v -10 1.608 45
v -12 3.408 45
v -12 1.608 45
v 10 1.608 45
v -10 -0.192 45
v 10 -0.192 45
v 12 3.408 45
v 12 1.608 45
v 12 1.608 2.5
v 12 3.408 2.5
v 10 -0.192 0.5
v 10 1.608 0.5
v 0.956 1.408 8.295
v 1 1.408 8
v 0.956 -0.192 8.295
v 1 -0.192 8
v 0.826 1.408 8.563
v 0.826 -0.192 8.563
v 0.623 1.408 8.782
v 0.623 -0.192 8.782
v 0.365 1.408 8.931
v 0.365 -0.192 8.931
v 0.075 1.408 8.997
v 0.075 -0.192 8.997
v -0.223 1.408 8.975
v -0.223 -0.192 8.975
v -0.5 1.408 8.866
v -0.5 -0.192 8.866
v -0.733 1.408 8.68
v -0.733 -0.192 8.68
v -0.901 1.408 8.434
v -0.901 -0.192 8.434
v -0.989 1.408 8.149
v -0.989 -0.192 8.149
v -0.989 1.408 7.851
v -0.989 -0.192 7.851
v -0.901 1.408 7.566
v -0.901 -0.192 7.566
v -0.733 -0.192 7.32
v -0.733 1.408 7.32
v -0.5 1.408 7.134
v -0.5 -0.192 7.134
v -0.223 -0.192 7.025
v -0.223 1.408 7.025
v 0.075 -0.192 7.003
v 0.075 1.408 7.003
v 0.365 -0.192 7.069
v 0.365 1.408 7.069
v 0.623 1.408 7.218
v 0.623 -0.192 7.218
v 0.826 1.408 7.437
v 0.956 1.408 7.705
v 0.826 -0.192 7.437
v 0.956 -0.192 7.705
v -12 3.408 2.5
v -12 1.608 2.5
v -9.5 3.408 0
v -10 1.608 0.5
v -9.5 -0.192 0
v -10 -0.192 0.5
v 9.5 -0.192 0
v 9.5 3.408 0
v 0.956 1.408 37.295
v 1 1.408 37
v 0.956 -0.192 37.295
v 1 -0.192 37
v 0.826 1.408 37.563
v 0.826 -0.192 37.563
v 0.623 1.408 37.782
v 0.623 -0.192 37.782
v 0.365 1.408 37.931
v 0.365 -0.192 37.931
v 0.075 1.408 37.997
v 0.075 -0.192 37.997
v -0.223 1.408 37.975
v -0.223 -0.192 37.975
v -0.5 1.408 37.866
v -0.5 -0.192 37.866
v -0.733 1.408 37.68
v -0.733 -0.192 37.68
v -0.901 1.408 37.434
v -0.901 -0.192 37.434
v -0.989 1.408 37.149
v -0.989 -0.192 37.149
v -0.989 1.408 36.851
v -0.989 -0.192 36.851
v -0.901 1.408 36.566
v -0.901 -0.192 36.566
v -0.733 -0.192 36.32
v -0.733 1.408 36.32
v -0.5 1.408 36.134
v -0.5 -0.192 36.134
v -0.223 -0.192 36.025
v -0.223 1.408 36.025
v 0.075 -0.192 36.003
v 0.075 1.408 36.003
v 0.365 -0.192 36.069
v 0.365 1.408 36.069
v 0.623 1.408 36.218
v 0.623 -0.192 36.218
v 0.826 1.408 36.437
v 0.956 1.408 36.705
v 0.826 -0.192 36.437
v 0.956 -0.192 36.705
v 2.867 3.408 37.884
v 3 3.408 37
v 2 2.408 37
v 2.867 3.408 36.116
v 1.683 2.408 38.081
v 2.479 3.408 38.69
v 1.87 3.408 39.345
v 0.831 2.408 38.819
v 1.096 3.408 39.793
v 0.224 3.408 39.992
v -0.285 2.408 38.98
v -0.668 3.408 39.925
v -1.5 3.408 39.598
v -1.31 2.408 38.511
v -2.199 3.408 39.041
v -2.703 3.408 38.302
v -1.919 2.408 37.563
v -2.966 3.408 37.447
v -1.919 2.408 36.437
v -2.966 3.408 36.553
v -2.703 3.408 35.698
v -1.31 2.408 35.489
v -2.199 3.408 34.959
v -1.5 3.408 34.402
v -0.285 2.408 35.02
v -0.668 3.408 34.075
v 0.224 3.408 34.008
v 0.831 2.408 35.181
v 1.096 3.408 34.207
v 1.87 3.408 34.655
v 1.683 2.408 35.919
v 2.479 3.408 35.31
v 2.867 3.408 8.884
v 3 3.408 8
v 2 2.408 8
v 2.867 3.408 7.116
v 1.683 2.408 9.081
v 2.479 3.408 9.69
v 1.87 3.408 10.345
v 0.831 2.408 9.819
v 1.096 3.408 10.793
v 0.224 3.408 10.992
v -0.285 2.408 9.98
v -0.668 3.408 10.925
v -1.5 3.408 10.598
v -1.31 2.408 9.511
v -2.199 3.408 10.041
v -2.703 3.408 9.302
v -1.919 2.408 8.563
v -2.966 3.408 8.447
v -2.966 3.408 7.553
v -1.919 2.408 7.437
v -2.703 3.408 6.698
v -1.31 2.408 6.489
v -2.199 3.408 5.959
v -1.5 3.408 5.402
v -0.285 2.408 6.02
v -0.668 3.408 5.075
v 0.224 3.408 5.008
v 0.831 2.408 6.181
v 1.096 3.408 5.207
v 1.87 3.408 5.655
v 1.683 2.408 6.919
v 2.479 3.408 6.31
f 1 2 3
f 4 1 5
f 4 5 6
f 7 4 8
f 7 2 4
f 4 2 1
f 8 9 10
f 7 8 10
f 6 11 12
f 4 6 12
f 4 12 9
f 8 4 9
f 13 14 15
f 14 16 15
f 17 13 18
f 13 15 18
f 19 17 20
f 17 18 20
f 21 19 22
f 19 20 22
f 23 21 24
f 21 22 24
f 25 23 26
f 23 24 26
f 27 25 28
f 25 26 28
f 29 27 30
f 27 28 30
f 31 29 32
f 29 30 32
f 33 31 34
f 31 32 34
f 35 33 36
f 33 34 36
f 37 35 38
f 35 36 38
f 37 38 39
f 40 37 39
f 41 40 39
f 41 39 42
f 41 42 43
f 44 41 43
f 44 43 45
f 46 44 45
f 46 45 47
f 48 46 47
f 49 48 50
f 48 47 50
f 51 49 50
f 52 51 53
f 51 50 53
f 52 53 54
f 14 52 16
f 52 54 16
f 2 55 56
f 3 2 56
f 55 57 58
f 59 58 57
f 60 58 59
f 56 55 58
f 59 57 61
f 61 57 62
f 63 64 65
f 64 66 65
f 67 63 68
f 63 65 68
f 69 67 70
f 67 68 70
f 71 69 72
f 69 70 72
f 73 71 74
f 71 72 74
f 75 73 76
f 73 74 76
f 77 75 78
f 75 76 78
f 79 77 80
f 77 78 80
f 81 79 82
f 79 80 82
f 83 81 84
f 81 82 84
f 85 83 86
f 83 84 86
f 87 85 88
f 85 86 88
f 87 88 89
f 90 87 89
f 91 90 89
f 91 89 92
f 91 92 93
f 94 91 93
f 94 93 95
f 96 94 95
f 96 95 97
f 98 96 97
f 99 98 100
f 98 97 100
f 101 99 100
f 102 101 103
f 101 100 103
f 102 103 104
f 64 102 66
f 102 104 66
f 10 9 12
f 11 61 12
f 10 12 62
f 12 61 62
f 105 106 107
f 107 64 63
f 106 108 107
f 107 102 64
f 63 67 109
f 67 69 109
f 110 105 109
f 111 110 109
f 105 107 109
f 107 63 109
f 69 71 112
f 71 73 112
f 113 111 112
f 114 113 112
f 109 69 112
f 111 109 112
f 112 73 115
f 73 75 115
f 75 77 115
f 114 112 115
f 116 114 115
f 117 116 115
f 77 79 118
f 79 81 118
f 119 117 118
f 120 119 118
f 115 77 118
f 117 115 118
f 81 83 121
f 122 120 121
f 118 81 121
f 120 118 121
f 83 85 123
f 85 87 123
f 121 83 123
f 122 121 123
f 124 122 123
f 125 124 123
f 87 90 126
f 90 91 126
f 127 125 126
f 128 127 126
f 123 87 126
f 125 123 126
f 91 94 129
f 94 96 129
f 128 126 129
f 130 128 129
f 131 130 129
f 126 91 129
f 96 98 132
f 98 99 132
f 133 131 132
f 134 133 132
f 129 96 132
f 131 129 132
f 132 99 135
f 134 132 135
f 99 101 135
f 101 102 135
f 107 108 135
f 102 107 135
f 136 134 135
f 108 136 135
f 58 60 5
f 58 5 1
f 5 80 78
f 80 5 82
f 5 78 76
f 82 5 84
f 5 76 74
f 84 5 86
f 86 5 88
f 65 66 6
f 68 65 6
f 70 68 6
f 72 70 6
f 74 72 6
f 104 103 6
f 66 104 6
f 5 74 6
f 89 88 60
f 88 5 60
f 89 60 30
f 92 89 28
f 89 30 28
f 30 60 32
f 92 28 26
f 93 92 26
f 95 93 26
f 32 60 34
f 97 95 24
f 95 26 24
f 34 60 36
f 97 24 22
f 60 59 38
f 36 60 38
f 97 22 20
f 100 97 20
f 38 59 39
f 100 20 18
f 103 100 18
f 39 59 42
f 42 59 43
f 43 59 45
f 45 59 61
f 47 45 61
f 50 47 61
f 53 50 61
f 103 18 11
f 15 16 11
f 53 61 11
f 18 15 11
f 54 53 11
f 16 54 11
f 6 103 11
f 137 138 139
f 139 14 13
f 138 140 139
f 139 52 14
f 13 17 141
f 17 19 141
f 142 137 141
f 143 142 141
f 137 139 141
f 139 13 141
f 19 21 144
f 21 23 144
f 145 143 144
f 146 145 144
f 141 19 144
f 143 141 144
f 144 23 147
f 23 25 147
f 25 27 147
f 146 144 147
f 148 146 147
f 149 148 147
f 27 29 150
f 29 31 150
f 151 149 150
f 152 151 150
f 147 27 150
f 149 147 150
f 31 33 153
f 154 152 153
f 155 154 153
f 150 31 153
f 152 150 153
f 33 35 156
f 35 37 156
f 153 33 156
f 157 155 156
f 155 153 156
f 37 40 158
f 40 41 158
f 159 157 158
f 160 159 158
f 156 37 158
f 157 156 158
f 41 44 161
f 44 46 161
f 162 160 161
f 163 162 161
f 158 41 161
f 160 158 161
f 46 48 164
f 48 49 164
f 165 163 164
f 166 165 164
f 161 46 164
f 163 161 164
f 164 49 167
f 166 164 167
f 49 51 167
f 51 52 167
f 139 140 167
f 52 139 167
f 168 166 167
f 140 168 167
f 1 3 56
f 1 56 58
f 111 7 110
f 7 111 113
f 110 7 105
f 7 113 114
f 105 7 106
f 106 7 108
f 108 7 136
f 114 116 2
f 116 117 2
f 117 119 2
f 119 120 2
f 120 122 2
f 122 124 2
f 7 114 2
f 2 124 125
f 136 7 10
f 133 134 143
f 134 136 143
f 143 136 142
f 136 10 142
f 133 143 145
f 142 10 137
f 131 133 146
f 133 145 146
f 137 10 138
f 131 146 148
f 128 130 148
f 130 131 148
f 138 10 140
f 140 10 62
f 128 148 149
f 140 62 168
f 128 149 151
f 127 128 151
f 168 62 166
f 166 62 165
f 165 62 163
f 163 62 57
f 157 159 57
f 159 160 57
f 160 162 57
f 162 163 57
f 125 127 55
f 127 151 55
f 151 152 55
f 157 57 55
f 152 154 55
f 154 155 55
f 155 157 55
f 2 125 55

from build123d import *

# Parameters (mm, degrees)
F0_W           = 20
F0_H           = 1.8
F1_DEPTH       = 45
F2_SIZE        = 2.5
F3_SIZE        = 2.5
F5_D           = 2
F5_DEPTH       = 15
F5_CSINK_D     = 6
F5_CSINK_ANGLE = 90


with BuildPart() as f1:
    # F0 (on Top) → F1 (new body)
    with BuildSketch(Plane.XY):
        Polygon((12, 3.40756), (-12, 3.40756), (-12, 1.60756), (-10, 1.60756), (10, 1.60756), (12, 1.60756), align=None)
        with Locations((0, 0.70756)):
            Rectangle(F0_W, F0_H)
    extrude(amount=F1_DEPTH)

    # F2
    f2_edges = [f1.edges().sort_by_distance(p)[0] for p in [
        (12, 2.50756, 0),
    ]]
    chamfer(f2_edges, length=F2_SIZE)

    # F3
    f3_edges = [f1.edges().sort_by_distance(p)[0] for p in [
        (-12, 2.50756, 0),
    ]]
    chamfer(f3_edges, length=F3_SIZE)

    # F5
    with Locations(Plane(origin=(0, 3.40756, 0), x_dir=(-1, 0, 0), z_dir=(0, 1, 0))):
        with Locations((0, 37), (0, 8)):
            CounterSinkHole(F5_D / 2, F5_CSINK_D / 2, depth=F5_DEPTH, counter_sink_angle=F5_CSINK_ANGLE)


solid = f1.part
